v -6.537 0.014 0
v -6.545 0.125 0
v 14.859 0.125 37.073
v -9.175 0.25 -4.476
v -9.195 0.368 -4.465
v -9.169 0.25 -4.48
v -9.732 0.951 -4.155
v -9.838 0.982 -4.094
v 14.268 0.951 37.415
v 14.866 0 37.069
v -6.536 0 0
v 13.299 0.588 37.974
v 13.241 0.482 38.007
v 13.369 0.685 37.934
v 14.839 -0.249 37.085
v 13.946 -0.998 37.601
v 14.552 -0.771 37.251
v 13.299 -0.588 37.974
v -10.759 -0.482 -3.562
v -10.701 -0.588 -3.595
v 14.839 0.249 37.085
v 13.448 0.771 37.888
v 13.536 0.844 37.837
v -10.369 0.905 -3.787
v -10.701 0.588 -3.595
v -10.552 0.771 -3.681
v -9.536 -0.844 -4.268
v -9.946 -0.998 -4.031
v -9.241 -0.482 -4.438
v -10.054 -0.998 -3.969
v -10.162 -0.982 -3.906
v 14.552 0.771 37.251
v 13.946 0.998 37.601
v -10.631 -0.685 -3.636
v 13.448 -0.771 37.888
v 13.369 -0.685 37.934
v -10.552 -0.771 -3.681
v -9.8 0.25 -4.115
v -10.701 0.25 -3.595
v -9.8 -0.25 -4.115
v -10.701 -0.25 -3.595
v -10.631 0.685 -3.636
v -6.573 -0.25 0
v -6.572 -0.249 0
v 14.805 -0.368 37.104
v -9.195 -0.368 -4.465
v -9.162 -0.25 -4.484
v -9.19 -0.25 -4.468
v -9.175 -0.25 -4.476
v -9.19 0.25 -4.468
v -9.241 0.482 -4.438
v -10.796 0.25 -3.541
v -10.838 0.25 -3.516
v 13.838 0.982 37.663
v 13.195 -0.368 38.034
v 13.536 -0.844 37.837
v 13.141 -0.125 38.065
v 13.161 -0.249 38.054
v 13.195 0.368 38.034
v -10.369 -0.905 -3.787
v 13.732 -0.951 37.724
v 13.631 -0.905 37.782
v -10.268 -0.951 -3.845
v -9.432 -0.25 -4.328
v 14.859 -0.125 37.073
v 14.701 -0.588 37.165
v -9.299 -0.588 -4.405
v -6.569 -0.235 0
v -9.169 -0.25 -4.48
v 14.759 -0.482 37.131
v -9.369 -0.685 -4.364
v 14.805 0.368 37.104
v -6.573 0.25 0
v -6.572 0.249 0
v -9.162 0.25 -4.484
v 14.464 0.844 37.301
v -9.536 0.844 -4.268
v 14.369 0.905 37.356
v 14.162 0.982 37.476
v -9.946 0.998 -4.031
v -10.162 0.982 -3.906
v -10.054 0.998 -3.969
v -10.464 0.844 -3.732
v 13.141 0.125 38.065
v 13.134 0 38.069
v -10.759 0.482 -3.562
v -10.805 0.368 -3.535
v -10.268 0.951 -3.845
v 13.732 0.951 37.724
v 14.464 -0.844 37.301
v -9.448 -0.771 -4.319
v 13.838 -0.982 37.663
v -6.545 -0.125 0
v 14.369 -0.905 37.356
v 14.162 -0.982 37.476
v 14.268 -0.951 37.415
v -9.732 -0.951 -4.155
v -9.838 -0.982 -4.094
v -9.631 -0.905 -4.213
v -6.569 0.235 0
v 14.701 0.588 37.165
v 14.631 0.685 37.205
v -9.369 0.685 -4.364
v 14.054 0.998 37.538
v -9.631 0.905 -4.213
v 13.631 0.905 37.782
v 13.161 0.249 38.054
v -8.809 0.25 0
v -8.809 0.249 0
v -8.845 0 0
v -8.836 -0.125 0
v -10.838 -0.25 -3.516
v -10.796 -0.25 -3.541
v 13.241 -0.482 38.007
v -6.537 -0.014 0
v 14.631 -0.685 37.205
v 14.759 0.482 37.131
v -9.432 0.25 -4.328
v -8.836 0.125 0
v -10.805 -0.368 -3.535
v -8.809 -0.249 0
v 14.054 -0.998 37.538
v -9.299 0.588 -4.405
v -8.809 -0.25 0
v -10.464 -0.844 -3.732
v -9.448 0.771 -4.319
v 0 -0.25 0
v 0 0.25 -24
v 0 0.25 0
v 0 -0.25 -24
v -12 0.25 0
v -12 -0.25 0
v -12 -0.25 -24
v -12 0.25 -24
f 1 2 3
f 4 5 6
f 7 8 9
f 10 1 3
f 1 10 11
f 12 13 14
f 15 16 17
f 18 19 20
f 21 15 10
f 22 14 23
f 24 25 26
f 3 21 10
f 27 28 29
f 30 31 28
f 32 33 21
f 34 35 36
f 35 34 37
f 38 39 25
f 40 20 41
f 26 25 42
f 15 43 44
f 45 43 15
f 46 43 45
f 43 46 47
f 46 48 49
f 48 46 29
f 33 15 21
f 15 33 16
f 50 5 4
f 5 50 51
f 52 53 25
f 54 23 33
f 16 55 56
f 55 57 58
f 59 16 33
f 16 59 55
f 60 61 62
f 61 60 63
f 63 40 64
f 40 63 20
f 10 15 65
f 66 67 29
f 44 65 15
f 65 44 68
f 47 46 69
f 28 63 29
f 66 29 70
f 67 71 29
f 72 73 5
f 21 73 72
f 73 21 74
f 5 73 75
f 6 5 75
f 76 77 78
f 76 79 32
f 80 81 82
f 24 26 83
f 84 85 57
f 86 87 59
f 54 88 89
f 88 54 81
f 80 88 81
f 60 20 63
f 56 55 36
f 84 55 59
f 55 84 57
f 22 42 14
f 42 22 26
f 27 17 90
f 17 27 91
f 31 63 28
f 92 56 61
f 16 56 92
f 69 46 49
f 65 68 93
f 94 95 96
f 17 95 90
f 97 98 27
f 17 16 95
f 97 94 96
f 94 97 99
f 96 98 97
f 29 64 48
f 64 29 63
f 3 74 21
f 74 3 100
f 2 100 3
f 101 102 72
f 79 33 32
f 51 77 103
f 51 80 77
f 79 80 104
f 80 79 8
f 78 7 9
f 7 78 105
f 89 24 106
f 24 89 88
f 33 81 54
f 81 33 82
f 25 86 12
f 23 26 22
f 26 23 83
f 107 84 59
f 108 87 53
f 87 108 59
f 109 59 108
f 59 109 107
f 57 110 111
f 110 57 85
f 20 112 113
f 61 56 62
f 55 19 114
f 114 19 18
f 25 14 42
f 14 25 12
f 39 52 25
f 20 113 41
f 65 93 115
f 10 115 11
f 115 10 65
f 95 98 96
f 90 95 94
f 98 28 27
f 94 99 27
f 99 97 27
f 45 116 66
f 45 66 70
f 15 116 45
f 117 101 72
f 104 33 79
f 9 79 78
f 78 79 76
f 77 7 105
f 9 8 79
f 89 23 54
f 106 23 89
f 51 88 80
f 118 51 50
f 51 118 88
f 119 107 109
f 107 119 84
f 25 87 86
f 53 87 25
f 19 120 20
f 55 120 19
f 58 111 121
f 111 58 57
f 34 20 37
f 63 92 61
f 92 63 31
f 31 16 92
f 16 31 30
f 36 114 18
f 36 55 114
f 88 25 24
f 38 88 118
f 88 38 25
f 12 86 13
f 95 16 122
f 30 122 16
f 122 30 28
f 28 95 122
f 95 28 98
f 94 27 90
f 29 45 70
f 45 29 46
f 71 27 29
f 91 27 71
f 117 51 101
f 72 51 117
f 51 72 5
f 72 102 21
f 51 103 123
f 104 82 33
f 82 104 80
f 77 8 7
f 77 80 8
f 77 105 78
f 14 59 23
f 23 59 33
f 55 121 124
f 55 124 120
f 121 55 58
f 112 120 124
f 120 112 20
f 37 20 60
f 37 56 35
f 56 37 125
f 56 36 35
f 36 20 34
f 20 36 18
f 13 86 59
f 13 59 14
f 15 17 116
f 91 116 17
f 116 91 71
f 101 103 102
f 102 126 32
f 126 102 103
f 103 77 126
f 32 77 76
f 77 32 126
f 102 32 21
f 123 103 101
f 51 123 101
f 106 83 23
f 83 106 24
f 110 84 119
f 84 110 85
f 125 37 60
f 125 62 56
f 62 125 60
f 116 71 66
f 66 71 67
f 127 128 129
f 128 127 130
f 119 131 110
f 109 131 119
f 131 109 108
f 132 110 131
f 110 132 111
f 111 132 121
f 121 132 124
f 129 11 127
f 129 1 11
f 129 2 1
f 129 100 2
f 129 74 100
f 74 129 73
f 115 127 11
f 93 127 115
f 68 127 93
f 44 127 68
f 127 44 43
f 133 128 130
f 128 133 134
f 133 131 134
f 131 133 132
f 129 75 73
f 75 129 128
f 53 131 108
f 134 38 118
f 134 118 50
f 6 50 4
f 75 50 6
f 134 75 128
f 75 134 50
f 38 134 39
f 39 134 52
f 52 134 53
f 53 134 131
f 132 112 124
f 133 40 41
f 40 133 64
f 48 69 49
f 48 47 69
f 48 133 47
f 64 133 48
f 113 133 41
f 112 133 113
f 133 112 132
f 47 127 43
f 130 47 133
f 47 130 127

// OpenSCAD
module rudder(length=12,height=24, y_angle=0, z_angle=0, handle_length=48, handle_angle=30){
	plywood_thickness=.5;

	rotate([0,y_angle,z_angle]){
		translate([-length+2,0,-4])
			rotate([0,handle_angle,0])
			cylinder(h=handle_length,d=2, $fn=50);
		translate([-length,-plywood_thickness/2,-height])
			cube([length,plywood_thickness,height]);
	}
}
rudder();
